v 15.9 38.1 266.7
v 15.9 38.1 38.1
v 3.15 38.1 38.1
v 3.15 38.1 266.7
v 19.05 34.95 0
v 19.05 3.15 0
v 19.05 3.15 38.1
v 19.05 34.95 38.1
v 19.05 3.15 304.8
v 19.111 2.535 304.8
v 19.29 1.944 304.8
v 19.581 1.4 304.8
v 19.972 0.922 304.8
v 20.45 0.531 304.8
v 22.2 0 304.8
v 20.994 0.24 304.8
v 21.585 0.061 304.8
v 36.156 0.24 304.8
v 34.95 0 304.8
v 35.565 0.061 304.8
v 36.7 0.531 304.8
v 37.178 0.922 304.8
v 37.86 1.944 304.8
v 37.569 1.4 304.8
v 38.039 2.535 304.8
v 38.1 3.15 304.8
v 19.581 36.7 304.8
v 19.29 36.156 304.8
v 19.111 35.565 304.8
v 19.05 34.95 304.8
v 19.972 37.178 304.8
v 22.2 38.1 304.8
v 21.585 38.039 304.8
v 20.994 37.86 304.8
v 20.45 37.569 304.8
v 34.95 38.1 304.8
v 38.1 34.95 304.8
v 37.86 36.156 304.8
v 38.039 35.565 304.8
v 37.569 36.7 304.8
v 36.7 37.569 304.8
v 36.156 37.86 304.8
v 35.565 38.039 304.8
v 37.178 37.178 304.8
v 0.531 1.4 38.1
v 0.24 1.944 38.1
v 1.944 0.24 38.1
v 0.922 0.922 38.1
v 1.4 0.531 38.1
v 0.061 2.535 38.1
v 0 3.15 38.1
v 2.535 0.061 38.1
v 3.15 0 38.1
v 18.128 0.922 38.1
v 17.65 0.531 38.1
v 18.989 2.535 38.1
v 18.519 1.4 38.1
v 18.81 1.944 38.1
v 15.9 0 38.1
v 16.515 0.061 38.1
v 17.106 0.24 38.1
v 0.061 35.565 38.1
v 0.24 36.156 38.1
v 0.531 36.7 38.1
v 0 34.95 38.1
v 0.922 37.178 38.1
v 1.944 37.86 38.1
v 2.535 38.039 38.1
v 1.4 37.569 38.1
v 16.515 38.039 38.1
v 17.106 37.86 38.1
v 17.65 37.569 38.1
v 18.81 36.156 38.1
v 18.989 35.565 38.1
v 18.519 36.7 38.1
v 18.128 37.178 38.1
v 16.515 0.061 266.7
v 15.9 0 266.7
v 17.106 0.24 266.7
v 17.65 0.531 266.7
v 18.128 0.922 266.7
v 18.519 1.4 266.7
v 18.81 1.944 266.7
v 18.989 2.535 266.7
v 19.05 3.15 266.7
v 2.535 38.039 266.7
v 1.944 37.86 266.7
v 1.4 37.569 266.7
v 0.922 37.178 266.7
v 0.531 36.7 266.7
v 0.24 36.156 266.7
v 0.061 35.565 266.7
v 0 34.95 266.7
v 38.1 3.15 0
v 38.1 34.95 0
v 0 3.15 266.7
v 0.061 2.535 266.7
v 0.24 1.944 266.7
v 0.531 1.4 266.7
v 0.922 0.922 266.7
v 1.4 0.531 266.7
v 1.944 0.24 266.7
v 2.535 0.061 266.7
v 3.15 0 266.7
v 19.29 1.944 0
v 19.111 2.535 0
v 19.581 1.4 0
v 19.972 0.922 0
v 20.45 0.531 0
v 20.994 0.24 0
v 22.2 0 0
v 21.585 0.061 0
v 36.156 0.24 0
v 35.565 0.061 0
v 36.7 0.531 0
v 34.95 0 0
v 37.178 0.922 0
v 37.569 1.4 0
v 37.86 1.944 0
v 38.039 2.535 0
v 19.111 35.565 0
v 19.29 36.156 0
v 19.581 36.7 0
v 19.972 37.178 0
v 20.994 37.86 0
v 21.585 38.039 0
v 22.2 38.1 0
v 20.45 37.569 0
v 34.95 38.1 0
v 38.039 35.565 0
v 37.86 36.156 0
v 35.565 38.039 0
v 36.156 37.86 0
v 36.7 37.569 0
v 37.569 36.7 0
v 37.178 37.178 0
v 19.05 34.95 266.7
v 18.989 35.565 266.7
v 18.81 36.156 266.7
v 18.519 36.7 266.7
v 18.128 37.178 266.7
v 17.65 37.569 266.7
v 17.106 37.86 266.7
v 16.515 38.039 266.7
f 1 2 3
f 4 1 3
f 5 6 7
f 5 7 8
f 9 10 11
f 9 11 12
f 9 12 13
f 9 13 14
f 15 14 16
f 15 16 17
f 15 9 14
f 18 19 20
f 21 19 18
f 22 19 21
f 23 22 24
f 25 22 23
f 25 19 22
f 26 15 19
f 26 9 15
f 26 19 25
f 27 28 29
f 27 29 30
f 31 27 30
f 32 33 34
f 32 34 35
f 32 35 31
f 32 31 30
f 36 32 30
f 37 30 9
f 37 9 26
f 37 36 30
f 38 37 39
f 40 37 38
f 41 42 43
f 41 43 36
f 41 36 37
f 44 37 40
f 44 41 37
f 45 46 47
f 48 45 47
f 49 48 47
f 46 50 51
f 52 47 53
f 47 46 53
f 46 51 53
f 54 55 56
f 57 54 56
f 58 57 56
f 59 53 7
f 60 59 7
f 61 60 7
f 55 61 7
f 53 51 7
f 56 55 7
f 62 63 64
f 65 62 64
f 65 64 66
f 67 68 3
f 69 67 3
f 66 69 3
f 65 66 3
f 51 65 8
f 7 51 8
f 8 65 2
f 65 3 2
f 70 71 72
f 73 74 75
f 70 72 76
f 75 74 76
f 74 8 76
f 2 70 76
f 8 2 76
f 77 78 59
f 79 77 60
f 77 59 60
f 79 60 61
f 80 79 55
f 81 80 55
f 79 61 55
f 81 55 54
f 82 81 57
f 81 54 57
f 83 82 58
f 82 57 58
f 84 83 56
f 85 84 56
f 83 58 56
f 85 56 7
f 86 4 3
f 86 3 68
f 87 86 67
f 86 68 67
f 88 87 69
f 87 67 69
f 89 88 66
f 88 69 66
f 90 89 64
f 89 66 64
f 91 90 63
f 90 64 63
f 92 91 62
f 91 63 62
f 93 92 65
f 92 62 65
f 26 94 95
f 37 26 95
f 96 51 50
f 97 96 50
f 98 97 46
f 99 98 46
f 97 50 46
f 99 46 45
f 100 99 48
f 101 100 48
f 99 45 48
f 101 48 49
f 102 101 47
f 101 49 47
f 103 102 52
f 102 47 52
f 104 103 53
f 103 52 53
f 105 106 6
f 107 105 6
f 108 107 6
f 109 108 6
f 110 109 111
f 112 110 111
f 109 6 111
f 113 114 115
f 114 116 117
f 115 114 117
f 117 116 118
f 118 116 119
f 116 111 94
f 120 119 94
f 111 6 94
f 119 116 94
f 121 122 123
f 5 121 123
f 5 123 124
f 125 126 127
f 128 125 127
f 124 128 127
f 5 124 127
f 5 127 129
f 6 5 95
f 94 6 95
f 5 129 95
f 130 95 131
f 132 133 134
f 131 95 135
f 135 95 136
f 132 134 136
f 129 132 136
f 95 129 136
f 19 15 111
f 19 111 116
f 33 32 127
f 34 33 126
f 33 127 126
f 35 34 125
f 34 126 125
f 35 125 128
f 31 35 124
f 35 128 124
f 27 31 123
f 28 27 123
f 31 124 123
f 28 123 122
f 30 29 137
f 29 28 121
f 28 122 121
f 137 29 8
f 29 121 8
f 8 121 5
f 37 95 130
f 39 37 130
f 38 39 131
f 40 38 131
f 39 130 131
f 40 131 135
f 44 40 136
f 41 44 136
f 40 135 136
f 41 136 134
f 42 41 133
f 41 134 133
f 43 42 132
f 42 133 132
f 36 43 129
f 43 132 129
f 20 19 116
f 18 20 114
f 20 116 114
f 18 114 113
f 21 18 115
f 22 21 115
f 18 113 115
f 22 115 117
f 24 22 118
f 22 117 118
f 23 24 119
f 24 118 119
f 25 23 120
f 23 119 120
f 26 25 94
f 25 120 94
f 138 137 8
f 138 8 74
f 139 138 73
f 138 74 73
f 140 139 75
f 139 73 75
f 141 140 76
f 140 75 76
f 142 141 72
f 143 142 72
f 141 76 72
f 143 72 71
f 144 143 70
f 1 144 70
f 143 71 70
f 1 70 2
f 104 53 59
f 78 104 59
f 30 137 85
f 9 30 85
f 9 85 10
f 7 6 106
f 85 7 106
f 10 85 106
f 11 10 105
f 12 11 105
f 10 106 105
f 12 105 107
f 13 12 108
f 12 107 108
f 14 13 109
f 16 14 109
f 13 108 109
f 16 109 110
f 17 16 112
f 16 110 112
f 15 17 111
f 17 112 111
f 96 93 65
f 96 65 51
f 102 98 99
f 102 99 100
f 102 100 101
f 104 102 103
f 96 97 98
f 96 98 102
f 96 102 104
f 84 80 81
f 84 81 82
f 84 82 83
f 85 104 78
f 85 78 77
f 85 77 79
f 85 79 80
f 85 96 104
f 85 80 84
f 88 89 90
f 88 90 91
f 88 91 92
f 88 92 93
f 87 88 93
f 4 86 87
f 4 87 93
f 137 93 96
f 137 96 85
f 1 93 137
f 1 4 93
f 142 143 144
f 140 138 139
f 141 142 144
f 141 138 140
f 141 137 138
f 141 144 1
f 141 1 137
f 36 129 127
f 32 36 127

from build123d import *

# Parameters (mm, degrees)
F1_DEPTH = 304.8
F2_DEPTH = 266.7
F3_DEPTH = 38.1


# Not quite as in the source:
# - a feature names something its author has since deleted; it is built from what else it names


with BuildPart() as f1:
    # F0 (on Top) → F1 (new body)
    with BuildSketch(Plane.XY):
        with BuildLine():
            Line((19.05, 34.9504), (19.05, 3.1496))
            ThreePointArc((19.05, 3.1496), (19.972496482, 0.922496482), (22.1996, 0))
            Line((22.1996, 0), (34.9504, 0))
            ThreePointArc((34.9504, 0), (37.177503518, 0.922496482), (38.1, 3.1496))
            Line((38.1, 3.1496), (38.1, 34.9504))
            ThreePointArc((38.1, 34.9504), (37.177503518, 37.177503518), (34.9504, 38.1))
            Line((34.9504, 38.1), (22.1996, 38.1))
            ThreePointArc((22.1996, 38.1), (19.972496482, 37.177503518), (19.05, 34.9504))
        make_face()
    extrude(amount=F1_DEPTH)

    # F0 (on Top) → F2 (join)
    with BuildSketch(Plane.XY):
        with BuildLine():
            ThreePointArc((0, 3.1496), (0.922496482, 0.922496482), (3.1496, 0))
            Line((3.1496, 0), (15.9004, 0))
            ThreePointArc((15.9004, 0), (18.127503518, 0.922496482), (19.05, 3.1496))
            Line((19.05, 3.1496), (19.05, 34.9504))
            ThreePointArc((19.05, 34.9504), (18.127503518, 37.177503518), (15.9004, 38.1))
            Line((15.9004, 38.1), (3.1496, 38.1))
            ThreePointArc((3.1496, 38.1), (0.922496482, 37.177503518), (0, 34.9504))
            Line((0, 34.9504), (0, 3.1496))
        make_face()
        with BuildLine():
            Line((19.05, 34.9504), (19.05, 3.1496))
            ThreePointArc((19.05, 3.1496), (19.972496482, 0.922496482), (22.1996, 0))
            Line((22.1996, 0), (34.9504, 0))
            ThreePointArc((34.9504, 0), (37.177503518, 0.922496482), (38.1, 3.1496))
            Line((38.1, 3.1496), (38.1, 34.9504))
            ThreePointArc((38.1, 34.9504), (37.177503518, 37.177503518), (34.9504, 38.1))
            Line((34.9504, 38.1), (22.1996, 38.1))
            ThreePointArc((22.1996, 38.1), (19.972496482, 37.177503518), (19.05, 34.9504))
        make_face()
    extrude(amount=F2_DEPTH)

    # F0 (on Top) → F3 (cut)
    with BuildSketch(Plane.XY):
        with BuildLine():
            ThreePointArc((0, 3.1496), (0.922496482, 0.922496482), (3.1496, 0))
            Line((3.1496, 0), (15.9004, 0))
            ThreePointArc((15.9004, 0), (18.127503518, 0.922496482), (19.05, 3.1496))
            Line((19.05, 3.1496), (19.05, 34.9504))
            ThreePointArc((19.05, 34.9504), (18.127503518, 37.177503518), (15.9004, 38.1))
            Line((15.9004, 38.1), (3.1496, 38.1))
            ThreePointArc((3.1496, 38.1), (0.922496482, 37.177503518), (0, 34.9504))
            Line((0, 34.9504), (0, 3.1496))
        make_face()
    extrude(amount=F3_DEPTH, mode=Mode.SUBTRACT)


solid = f1.part
